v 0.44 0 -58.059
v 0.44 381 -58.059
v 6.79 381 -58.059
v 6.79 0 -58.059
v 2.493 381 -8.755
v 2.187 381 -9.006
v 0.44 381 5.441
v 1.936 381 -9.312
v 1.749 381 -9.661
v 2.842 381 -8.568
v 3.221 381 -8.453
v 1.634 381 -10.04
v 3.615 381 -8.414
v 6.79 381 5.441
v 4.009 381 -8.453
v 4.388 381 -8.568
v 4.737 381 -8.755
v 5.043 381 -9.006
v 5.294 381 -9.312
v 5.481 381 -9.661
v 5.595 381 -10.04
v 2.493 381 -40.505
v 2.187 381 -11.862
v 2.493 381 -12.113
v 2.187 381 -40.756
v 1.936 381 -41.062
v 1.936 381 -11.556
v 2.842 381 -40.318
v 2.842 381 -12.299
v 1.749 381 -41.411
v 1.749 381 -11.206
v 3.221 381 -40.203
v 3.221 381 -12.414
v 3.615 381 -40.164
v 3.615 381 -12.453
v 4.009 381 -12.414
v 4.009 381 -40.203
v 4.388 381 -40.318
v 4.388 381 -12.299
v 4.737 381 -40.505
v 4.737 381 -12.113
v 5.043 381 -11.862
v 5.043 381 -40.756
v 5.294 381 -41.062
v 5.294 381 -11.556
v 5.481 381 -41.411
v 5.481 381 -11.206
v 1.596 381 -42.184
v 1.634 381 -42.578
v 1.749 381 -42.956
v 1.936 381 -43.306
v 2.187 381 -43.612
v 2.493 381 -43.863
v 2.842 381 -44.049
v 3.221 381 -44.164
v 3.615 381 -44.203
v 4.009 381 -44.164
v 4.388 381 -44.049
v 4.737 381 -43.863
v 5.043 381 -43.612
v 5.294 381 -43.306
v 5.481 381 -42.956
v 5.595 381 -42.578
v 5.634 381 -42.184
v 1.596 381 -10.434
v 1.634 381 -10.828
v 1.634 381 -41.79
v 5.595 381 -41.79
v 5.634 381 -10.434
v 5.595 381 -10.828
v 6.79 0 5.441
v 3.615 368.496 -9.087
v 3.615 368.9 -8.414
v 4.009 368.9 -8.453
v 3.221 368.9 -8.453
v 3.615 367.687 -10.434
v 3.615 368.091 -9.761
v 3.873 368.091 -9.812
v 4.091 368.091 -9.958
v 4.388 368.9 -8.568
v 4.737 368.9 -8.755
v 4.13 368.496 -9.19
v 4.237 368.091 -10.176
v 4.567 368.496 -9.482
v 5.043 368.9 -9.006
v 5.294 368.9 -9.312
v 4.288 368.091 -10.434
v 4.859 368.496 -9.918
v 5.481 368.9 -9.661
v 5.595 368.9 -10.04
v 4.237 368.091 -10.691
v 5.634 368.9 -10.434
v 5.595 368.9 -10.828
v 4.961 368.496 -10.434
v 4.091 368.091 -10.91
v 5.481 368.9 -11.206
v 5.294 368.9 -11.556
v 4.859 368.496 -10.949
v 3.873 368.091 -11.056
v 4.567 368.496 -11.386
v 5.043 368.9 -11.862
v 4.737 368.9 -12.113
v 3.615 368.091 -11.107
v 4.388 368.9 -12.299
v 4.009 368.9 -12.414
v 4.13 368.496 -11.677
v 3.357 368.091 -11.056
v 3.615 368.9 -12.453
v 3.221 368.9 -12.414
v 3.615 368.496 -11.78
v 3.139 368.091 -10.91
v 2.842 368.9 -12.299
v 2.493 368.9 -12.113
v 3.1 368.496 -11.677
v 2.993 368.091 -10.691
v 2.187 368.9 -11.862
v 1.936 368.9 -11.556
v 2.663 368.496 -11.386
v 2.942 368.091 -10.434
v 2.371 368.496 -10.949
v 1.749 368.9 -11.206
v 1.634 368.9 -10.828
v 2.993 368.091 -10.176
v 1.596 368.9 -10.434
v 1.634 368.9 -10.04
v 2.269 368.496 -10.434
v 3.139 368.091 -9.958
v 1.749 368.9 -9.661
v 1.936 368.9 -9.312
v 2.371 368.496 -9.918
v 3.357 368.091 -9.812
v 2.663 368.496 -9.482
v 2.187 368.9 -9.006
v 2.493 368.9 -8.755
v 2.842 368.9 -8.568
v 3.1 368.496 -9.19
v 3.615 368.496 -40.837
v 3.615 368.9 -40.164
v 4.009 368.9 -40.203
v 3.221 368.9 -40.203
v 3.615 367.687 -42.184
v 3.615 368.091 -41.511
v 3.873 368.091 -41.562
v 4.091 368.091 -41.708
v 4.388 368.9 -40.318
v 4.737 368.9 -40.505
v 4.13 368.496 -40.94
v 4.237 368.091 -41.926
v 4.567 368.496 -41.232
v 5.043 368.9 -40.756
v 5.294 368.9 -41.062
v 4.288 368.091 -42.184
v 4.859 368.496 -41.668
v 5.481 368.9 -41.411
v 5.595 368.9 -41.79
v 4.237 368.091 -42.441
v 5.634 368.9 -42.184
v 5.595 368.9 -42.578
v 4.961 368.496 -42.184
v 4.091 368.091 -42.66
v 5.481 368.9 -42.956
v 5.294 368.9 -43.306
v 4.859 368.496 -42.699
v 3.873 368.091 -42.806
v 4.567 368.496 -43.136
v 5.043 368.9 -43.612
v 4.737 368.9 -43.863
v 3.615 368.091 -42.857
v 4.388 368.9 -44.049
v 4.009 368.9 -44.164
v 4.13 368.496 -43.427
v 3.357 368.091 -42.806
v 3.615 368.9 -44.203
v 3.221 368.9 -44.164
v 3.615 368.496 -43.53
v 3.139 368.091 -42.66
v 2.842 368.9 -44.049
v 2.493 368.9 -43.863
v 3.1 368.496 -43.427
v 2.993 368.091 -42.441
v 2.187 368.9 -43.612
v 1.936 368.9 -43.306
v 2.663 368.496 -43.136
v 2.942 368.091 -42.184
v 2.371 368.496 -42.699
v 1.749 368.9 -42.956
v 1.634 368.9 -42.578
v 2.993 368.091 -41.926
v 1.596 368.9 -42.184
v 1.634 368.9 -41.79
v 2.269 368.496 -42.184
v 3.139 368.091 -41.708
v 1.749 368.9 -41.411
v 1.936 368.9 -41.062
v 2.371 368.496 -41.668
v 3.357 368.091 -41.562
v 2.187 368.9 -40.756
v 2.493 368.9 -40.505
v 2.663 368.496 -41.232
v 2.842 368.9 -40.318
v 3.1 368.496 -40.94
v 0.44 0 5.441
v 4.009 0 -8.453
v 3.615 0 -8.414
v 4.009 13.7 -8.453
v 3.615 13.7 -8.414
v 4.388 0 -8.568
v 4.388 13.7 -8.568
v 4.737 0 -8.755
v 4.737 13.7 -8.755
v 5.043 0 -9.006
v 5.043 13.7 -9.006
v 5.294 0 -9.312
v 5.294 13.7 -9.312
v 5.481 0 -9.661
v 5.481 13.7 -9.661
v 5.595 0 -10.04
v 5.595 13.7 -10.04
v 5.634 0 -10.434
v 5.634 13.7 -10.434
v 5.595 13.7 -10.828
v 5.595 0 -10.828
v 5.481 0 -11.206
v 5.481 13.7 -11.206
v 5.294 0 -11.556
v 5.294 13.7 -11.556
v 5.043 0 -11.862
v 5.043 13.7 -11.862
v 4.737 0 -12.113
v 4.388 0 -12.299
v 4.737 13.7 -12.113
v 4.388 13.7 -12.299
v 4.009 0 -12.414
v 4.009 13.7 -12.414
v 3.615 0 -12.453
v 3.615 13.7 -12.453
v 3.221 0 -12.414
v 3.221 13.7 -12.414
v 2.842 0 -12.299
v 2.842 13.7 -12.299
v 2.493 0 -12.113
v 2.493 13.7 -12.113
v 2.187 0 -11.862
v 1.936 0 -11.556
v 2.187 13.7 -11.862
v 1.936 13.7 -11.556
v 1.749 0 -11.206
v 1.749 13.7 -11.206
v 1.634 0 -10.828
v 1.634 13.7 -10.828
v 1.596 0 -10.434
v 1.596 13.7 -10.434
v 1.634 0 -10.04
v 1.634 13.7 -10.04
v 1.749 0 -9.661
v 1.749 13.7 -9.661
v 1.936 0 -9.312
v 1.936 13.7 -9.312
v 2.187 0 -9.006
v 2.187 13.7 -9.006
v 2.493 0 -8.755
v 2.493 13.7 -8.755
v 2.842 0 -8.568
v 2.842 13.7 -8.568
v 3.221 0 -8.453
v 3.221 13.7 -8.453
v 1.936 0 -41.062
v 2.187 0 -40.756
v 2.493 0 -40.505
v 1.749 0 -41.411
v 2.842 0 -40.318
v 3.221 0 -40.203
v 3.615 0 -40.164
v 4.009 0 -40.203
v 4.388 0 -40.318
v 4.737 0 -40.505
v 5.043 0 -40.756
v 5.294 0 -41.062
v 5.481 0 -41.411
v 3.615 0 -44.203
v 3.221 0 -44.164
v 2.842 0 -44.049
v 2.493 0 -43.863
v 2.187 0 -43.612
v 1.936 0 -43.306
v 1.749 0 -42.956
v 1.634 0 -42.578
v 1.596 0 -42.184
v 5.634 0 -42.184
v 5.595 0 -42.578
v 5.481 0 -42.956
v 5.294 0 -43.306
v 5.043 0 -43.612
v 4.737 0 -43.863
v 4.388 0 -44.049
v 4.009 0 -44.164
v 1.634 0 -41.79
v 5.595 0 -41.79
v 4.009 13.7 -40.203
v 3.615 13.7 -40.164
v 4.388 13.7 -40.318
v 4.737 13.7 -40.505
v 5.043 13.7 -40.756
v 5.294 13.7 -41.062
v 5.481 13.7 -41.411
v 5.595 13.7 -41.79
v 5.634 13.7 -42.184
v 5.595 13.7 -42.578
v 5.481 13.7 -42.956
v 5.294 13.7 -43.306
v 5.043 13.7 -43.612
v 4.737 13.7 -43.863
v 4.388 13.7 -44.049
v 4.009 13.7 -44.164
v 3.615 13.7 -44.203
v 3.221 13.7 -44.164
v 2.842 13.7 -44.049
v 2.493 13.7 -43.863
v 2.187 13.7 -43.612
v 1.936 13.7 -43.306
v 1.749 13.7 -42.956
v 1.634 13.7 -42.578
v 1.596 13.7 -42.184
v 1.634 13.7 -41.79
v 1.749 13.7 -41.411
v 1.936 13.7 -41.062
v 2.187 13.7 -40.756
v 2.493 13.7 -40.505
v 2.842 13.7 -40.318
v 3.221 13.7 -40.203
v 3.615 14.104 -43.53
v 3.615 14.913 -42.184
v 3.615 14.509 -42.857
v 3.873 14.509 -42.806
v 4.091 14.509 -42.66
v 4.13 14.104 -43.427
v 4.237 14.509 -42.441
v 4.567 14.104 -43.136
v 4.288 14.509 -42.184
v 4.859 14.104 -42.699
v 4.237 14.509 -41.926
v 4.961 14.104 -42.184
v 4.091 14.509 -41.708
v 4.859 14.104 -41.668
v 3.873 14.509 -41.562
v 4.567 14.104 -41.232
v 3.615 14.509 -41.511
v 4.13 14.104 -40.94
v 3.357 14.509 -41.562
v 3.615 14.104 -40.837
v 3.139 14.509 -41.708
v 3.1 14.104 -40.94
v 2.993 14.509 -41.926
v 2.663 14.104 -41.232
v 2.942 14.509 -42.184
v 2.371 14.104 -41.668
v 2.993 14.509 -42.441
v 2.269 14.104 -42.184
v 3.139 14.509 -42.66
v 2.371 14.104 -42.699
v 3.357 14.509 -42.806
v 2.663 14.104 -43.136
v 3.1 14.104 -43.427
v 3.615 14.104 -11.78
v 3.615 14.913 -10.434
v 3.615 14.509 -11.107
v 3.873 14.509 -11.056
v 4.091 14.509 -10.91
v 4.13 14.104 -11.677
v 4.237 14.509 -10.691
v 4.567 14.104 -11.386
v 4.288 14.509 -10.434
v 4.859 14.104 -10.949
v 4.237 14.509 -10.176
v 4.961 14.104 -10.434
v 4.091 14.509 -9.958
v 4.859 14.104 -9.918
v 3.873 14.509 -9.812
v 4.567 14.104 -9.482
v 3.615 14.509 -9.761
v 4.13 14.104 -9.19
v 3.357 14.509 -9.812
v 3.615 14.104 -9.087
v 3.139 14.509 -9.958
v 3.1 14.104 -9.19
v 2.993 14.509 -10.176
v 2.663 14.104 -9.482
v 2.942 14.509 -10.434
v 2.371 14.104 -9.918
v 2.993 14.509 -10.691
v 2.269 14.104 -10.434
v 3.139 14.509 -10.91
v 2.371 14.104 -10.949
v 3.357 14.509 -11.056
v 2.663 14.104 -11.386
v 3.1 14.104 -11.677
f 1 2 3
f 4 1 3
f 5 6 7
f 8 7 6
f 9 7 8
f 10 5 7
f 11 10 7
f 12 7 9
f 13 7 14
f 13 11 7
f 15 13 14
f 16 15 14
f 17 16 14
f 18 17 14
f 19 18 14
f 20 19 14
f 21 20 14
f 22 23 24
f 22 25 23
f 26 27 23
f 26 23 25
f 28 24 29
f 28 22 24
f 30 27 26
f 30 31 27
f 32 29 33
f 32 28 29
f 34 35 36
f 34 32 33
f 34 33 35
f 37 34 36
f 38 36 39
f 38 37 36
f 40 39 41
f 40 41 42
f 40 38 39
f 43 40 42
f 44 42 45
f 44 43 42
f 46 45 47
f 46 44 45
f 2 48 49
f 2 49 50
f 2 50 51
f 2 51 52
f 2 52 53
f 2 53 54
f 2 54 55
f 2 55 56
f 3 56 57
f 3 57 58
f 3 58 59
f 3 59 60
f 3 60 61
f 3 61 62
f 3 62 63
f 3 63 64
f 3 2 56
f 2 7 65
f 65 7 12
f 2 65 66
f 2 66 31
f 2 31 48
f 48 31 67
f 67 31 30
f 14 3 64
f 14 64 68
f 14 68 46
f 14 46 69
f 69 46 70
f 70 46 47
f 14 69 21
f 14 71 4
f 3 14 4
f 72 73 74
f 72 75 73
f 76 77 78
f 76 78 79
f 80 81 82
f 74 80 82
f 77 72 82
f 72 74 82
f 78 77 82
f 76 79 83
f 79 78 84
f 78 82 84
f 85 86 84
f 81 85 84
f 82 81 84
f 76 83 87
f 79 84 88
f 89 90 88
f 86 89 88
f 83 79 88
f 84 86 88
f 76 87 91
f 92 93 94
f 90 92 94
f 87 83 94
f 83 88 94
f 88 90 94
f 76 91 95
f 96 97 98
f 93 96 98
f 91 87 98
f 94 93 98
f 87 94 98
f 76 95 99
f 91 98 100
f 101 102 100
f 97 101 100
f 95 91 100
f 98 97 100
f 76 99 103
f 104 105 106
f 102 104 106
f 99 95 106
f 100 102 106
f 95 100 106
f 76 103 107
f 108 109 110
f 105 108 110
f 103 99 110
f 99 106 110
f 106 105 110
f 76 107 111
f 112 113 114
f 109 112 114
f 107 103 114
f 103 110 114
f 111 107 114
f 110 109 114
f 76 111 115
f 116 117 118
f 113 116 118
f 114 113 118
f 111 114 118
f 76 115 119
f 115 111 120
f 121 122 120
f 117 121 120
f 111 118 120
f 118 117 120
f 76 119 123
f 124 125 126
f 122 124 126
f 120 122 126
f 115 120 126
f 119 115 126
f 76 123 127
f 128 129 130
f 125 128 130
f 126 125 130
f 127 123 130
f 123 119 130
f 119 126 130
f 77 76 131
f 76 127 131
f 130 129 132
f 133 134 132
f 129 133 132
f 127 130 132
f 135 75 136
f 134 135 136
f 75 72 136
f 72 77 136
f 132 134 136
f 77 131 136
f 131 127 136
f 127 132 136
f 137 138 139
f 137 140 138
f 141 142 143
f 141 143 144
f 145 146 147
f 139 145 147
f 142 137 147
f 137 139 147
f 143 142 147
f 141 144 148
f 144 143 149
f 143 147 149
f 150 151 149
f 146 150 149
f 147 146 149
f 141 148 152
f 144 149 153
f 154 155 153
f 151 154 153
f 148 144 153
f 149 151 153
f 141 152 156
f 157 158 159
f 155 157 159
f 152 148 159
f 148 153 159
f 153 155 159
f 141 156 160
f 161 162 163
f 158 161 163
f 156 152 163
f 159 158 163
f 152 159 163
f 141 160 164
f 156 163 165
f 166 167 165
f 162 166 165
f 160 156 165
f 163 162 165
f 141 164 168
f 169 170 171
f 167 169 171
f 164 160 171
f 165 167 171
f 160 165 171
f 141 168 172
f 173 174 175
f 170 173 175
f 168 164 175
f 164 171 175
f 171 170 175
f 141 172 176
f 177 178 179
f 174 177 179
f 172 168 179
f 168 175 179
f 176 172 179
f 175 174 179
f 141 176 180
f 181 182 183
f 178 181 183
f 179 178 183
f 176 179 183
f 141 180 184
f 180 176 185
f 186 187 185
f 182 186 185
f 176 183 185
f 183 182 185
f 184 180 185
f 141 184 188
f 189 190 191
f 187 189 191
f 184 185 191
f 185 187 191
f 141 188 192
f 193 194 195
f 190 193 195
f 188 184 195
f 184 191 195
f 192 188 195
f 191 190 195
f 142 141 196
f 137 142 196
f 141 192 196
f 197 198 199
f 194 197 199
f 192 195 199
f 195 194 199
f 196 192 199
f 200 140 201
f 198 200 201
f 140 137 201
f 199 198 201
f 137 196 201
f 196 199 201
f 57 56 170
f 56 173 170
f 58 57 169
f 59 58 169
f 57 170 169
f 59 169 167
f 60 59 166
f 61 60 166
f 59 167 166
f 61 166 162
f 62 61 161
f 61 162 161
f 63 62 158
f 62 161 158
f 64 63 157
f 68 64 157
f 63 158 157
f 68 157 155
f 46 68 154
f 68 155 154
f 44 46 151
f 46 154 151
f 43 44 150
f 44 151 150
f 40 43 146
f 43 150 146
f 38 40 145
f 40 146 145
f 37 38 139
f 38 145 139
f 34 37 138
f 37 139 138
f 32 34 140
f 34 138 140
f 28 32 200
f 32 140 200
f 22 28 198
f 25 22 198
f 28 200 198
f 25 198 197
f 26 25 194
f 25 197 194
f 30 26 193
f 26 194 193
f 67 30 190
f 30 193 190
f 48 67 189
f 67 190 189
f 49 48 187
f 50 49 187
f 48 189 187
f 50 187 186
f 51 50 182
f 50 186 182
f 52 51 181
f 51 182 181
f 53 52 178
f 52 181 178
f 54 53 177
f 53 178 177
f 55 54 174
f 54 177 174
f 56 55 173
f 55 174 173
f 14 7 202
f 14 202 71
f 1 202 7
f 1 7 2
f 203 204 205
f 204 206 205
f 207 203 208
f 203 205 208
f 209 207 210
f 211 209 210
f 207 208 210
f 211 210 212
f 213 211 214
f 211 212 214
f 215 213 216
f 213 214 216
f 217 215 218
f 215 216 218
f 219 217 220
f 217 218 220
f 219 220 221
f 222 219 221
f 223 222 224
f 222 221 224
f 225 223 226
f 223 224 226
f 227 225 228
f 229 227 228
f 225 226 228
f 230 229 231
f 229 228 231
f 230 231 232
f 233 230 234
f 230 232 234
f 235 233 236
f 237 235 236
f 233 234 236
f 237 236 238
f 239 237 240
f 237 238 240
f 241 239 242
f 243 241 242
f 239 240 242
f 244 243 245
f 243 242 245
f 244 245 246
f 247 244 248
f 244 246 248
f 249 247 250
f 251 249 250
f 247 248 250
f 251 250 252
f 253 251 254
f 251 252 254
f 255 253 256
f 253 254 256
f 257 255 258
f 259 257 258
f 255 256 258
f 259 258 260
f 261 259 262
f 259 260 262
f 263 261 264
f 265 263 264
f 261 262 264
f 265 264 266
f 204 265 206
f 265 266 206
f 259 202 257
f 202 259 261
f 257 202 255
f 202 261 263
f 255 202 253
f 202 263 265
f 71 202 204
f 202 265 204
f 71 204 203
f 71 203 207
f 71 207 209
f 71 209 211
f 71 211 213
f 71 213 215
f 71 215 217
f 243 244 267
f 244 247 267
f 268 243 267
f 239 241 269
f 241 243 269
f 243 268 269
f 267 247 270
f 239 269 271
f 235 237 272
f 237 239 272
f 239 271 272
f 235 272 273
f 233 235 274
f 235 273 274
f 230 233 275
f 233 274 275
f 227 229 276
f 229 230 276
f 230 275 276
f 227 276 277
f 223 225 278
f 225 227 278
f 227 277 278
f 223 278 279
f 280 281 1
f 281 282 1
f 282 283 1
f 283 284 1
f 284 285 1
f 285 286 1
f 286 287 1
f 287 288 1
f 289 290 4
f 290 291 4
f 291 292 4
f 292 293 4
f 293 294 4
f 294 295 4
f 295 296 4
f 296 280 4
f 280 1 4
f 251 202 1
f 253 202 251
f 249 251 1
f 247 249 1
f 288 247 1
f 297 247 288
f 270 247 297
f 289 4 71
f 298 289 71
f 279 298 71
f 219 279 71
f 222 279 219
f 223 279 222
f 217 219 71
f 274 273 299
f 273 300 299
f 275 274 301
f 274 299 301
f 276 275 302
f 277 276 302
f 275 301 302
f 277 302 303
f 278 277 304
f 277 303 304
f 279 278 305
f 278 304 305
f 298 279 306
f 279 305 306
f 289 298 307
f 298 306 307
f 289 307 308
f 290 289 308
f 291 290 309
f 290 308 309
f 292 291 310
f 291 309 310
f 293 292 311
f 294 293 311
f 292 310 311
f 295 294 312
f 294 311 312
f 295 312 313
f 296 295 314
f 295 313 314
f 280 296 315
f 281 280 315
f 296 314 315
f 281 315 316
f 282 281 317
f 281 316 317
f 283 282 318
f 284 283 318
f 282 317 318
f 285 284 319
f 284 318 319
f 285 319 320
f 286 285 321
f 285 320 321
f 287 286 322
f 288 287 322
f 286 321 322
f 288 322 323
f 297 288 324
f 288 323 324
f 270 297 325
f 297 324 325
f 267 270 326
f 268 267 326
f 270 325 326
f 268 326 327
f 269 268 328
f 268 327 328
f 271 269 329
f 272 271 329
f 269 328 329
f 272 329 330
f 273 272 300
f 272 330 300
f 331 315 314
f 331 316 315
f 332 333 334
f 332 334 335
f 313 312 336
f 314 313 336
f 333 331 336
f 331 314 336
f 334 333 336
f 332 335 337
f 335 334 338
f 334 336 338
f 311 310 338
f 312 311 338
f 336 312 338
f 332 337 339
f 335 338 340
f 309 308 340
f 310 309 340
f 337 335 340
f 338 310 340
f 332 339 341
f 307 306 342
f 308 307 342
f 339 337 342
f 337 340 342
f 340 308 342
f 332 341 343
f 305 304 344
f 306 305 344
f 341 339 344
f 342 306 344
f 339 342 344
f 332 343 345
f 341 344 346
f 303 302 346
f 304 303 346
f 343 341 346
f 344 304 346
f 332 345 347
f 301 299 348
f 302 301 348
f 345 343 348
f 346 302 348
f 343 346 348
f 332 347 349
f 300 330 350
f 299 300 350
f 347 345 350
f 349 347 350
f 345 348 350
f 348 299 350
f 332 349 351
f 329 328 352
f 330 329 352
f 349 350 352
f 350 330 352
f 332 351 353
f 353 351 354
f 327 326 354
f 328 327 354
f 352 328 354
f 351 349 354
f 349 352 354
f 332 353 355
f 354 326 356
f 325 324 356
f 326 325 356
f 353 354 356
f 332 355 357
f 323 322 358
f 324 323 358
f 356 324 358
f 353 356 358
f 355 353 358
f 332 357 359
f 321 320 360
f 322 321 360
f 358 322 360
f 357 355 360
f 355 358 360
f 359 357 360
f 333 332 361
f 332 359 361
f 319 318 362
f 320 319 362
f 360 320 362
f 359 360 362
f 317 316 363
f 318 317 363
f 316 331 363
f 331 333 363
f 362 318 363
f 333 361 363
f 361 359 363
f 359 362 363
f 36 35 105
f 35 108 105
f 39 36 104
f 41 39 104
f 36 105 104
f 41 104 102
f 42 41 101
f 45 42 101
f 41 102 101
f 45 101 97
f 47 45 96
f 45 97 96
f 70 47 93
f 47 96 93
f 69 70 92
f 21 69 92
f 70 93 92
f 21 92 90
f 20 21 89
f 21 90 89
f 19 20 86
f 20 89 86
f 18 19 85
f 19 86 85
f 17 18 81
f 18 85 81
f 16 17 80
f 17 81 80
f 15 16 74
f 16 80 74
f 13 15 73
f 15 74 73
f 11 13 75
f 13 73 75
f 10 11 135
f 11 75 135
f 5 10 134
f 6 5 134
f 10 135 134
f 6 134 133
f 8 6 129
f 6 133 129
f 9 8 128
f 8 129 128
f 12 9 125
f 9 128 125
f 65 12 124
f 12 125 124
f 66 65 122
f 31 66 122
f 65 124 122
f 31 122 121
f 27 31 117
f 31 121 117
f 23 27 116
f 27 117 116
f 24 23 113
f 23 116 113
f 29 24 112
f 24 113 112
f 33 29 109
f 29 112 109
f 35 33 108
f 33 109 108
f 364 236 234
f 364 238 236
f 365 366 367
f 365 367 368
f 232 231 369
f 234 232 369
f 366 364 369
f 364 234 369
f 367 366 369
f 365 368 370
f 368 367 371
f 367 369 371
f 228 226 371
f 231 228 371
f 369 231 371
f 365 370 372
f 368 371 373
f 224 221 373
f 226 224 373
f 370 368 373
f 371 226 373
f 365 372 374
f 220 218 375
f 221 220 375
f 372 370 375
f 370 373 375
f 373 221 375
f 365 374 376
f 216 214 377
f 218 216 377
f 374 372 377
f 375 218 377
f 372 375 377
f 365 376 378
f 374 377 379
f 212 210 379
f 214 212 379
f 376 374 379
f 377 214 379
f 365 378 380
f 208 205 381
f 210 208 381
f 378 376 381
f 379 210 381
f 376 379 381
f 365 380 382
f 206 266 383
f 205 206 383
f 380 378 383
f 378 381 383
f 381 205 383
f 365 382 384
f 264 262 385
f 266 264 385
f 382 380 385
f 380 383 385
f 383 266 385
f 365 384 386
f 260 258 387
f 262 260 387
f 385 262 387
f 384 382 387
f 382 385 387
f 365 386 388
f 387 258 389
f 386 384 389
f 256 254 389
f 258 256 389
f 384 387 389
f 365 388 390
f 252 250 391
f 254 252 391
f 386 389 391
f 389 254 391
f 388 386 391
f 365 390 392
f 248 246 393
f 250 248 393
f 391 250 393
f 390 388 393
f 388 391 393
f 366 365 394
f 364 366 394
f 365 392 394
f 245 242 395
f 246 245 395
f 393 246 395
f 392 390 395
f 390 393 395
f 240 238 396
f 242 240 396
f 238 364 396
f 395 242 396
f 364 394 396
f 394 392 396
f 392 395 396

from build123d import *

# Parameters (mm, degrees)
SKETCH1_W                  = 6.35
SKETCH1_H                  = 63.5
BOSS_EXTRUDE1_DEPTH        = 381
F_10_32_TAPPED_HOLE1_D     = 4.0386
F_10_32_TAPPED_HOLE1_DEPTH = 12.1
F_10_32_TAPPED_HOLE1_TIP   = 1.213317848
F_10_32_TAPPED_HOLE2_D     = 4.0386
F_10_32_TAPPED_HOLE2_DEPTH = 13.7
F_10_32_TAPPED_HOLE2_TIP   = 1.213317848


with BuildPart() as part:
    # Sketch1 → Boss-Extrude1 (new body)
    with BuildSketch(Plane(origin=(0, 0, 0), x_dir=(1, 0, 0), z_dir=(0, 1, 0))):
        with Locations((3.614938025, 26.308652781)):
            Rectangle(SKETCH1_W, SKETCH1_H)
    extrude(amount=BOSS_EXTRUDE1_DEPTH)

    # #10-32 Tapped Hole1
    with Locations(Plane(origin=(3.614938025, 381, -42.183652781), x_dir=(0, 0, 1), z_dir=(0, 1, 0))):
        with Locations((0, 0), (31.75, 0)):
            Hole(F_10_32_TAPPED_HOLE1_D / 2, depth=F_10_32_TAPPED_HOLE1_DEPTH)
            with Locations((0, 0, -(F_10_32_TAPPED_HOLE1_DEPTH + F_10_32_TAPPED_HOLE1_TIP / 2))):  # 118° drill point
                Cone(0, F_10_32_TAPPED_HOLE1_D / 2, F_10_32_TAPPED_HOLE1_TIP, mode=Mode.SUBTRACT)

    # #10-32 Tapped Hole2
    with Locations(Plane(origin=(3.614938025, 0, -10.433652781), x_dir=(0, 0, -1), z_dir=(0, -1, 0))):
        with Locations((0, 0), (31.75, 0)):
            Hole(F_10_32_TAPPED_HOLE2_D / 2, depth=F_10_32_TAPPED_HOLE2_DEPTH)
            with Locations((0, 0, -(F_10_32_TAPPED_HOLE2_DEPTH + F_10_32_TAPPED_HOLE2_TIP / 2))):  # 118° drill point
                Cone(0, F_10_32_TAPPED_HOLE2_D / 2, F_10_32_TAPPED_HOLE2_TIP, mode=Mode.SUBTRACT)


solid = part.part
